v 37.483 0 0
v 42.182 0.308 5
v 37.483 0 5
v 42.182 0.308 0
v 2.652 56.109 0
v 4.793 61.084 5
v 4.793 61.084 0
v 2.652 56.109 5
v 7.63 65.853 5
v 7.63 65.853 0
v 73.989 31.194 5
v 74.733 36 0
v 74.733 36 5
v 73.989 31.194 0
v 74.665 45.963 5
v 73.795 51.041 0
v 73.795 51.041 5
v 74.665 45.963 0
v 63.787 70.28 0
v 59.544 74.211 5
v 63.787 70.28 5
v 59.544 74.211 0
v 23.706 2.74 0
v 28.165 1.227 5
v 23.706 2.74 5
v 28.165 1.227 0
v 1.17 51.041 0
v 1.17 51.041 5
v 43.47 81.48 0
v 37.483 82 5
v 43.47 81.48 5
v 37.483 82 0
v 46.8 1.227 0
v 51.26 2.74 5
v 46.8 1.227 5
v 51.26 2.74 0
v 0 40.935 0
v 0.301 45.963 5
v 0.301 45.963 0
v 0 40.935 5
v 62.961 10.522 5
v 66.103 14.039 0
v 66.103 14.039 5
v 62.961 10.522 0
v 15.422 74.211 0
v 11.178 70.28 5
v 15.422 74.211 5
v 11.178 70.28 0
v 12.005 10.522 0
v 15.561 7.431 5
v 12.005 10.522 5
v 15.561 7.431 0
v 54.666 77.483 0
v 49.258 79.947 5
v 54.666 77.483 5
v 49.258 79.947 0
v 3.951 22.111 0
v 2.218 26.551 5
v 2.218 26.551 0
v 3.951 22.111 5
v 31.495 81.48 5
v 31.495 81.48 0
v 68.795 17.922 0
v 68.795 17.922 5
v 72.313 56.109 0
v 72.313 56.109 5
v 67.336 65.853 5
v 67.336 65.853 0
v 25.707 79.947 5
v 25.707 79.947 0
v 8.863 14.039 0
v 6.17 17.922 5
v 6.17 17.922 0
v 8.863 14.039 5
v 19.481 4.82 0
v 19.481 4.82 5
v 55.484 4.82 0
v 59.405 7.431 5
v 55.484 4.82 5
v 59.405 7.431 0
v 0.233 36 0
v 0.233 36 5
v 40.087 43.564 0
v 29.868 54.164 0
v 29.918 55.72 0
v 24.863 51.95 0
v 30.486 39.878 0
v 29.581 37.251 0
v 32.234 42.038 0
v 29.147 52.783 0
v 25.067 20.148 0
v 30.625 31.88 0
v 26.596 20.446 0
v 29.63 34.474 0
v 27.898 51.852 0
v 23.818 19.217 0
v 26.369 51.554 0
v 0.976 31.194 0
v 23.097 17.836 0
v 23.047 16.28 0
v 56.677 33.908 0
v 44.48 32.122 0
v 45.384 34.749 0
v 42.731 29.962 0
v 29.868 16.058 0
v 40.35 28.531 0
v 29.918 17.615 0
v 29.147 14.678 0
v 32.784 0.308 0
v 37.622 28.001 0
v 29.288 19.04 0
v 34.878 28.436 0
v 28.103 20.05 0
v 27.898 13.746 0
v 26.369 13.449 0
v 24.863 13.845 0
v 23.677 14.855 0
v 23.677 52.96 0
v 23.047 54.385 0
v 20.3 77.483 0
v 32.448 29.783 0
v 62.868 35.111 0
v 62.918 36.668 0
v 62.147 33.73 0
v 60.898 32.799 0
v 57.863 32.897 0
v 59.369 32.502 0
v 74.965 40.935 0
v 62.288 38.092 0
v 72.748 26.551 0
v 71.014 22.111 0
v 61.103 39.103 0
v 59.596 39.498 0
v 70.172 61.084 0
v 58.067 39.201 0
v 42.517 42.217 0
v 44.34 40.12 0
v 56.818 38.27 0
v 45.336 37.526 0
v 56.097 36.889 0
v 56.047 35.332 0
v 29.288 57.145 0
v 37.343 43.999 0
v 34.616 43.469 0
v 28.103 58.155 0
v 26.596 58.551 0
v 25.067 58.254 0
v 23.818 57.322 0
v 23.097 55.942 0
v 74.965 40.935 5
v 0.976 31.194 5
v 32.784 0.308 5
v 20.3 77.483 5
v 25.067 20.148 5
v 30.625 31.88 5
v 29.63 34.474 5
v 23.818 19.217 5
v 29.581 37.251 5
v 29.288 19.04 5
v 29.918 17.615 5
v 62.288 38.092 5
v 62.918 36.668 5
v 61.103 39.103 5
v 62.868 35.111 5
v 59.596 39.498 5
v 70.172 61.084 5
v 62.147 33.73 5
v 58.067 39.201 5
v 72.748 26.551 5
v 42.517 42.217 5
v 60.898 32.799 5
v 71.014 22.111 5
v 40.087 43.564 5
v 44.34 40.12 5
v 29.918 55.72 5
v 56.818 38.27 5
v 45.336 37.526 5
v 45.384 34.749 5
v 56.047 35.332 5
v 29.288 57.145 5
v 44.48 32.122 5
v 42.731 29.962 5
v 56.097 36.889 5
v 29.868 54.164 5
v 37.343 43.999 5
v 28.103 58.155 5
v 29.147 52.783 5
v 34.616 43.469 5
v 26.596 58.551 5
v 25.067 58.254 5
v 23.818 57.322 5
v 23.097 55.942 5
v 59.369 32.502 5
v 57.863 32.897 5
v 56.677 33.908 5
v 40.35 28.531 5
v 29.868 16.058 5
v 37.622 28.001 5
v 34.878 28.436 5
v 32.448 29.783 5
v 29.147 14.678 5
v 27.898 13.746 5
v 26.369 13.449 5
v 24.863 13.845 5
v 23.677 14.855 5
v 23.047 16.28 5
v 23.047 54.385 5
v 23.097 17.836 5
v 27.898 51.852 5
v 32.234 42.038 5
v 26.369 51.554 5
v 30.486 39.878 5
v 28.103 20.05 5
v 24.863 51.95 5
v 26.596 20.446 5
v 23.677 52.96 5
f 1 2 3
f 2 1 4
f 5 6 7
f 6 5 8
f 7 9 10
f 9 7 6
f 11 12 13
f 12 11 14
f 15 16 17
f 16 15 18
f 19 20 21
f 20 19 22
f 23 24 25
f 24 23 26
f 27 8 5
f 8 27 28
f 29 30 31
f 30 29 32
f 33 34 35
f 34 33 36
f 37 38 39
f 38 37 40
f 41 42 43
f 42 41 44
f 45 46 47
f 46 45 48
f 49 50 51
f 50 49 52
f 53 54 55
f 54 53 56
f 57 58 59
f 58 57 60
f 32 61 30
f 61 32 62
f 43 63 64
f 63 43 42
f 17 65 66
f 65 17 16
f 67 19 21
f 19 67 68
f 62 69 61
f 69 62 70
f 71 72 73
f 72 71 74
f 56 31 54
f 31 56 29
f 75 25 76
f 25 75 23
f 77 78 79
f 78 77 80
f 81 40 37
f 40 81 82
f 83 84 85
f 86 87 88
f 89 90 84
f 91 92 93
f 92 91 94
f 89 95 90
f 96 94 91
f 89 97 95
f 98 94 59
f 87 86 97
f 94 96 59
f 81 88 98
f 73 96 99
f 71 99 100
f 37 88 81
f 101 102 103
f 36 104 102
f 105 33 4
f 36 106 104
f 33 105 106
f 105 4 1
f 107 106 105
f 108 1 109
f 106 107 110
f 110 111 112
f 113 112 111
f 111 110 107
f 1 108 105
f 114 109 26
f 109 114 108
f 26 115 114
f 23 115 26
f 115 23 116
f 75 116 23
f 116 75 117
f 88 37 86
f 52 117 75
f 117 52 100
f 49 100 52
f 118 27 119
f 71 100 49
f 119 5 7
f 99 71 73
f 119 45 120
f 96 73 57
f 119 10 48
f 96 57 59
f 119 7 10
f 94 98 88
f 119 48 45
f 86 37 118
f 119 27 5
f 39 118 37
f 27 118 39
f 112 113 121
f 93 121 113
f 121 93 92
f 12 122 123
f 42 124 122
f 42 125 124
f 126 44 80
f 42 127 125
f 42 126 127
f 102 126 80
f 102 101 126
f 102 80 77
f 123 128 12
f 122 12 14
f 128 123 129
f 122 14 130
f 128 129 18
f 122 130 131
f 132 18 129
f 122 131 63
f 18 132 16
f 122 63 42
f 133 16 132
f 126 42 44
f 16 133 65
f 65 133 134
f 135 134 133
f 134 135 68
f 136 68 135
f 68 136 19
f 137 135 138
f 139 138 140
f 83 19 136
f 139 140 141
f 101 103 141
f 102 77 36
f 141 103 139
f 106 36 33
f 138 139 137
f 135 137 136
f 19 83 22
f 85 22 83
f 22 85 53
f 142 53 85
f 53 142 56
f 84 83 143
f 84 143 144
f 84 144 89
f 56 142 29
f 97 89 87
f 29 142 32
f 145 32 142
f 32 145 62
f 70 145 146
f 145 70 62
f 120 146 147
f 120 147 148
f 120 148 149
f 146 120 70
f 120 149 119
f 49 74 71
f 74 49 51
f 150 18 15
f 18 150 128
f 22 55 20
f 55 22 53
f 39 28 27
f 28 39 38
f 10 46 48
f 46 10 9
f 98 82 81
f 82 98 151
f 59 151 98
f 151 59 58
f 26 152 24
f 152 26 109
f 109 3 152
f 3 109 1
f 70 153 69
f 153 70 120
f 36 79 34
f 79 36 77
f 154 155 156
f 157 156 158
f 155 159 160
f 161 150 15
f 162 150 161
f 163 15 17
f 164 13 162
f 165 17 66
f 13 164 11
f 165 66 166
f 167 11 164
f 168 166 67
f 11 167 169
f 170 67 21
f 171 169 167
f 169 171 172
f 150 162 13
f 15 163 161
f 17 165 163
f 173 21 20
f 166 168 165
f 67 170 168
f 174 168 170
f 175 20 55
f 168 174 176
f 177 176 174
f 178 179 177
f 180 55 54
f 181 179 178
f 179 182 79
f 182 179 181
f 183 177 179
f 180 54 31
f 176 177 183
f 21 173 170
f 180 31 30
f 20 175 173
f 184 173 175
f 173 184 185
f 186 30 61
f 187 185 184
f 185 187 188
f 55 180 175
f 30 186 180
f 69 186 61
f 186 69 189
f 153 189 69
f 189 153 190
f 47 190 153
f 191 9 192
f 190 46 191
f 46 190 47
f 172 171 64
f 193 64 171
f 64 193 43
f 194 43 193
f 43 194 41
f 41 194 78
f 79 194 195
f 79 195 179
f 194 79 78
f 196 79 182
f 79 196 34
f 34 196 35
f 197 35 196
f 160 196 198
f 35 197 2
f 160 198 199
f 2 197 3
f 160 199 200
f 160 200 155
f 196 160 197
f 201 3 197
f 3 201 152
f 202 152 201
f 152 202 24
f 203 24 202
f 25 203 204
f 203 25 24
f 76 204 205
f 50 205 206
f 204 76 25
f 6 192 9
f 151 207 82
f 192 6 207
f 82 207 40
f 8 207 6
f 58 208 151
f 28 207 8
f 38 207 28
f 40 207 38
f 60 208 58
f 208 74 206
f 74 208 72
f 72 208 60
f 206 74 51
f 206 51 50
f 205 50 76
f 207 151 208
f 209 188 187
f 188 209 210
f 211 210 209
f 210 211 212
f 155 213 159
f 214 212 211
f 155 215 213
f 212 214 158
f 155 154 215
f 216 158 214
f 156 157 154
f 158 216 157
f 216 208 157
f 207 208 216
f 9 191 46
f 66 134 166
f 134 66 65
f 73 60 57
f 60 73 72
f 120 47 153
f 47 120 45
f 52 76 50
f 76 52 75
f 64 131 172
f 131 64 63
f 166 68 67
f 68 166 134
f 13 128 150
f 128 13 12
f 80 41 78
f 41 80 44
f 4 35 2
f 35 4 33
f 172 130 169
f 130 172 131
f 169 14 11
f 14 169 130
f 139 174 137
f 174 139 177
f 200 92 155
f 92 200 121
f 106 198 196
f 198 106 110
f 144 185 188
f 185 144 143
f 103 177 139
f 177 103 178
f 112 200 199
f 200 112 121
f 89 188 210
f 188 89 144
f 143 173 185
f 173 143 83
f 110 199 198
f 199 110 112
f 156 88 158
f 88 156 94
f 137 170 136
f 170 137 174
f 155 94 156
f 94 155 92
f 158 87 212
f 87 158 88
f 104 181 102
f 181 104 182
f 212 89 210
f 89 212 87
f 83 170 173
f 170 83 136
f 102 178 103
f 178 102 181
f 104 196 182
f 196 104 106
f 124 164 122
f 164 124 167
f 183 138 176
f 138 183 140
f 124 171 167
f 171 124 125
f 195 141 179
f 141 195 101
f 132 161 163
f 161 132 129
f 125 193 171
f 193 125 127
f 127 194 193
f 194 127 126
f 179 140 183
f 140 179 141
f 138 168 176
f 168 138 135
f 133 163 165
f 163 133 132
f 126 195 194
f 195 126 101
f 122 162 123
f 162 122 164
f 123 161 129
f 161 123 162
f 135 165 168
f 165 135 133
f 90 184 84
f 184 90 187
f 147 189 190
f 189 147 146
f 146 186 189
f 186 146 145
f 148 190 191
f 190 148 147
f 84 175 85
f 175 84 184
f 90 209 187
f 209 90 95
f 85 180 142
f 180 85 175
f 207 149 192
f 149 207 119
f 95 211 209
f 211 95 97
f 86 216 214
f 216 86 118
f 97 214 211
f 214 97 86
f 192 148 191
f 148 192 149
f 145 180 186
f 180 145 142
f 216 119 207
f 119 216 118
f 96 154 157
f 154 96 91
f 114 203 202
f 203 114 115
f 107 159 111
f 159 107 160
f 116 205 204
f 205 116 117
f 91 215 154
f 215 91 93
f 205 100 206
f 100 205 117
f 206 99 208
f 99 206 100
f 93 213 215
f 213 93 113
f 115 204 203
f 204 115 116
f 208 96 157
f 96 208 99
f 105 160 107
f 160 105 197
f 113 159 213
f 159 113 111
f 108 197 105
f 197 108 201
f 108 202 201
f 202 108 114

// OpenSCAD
$fn = 32;

// ----------------------------------------------------------------------
// Cam plate: single_lobe cam, base R36
// ----------------------------------------------------------------------

// --- parameters (mm) ---
base_r = 36;              // base circle radius
lobe_h = 10;              // cam lobe rise
bore_r = 8;               // shaft bore radius
plate_t = 5;              // plate thickness, Z (extrusion height)
ring_r = 22;              // lightening ring radius
bolt_r = 3.5;             // lightening hole radius

profile = [[74.733, 36], [74.965, 40.935], [74.665, 45.963], [73.795, 51.041], [72.313, 56.109], [70.172, 61.084], [67.336, 65.853], [63.787, 70.28], [59.544, 74.211], [54.666, 77.483], [49.258, 79.947], [43.47, 81.48], [37.483, 82], [31.495, 81.48], [25.707, 79.947], [20.3, 77.483], [15.422, 74.211], [11.178, 70.28], [7.63, 65.853], [4.793, 61.084], [2.652, 56.109], [1.17, 51.041], [0.301, 45.963], [0, 40.935], [0.233, 36], [0.976, 31.194], [2.218, 26.551], [3.951, 22.111], [6.17, 17.922], [8.863, 14.039], [12.005, 10.522], [15.561, 7.431], [19.481, 4.82], [23.706, 2.74], [28.165, 1.227], [32.784, 0.308], [37.483, 0], [42.182, 0.308], [46.8, 1.227], [51.26, 2.74], [55.484, 4.82], [59.405, 7.431], [62.961, 10.522], [66.103, 14.039], [68.795, 17.922], [71.014, 22.111], [72.748, 26.551], [73.989, 31.194]];  // primary outline, 48 points, counter clockwise
void_1 = [[45.336, 37.526], [44.34, 40.12], [42.517, 42.217], [40.087, 43.564], [37.343, 43.999], [34.616, 43.469], [32.234, 42.038], [30.486, 39.878], [29.581, 37.251], [29.63, 34.474], [30.625, 31.88], [32.448, 29.783], [34.878, 28.436], [37.622, 28.001], [40.35, 28.531], [42.731, 29.962], [44.48, 32.122], [45.384, 34.749]];  // shaft bore, 18 points
void_2 = [[62.918, 36.668], [62.288, 38.092], [61.103, 39.103], [59.596, 39.498], [58.067, 39.201], [56.818, 38.27], [56.097, 36.889], [56.047, 35.332], [56.677, 33.908], [57.863, 32.897], [59.369, 32.502], [60.898, 32.799], [62.147, 33.73], [62.868, 35.111]];  // lightening hole 1, 14 points
void_3 = [[29.918, 55.72], [29.288, 57.145], [28.103, 58.155], [26.596, 58.551], [25.067, 58.254], [23.818, 57.322], [23.097, 55.942], [23.047, 54.385], [23.677, 52.96], [24.863, 51.95], [26.369, 51.554], [27.898, 51.852], [29.147, 52.783], [29.868, 54.164]];  // lightening hole 2, 14 points
void_4 = [[29.918, 17.615], [29.288, 19.04], [28.103, 20.05], [26.596, 20.446], [25.067, 20.148], [23.818, 19.217], [23.097, 17.836], [23.047, 16.28], [23.677, 14.855], [24.863, 13.845], [26.369, 13.449], [27.898, 13.746], [29.147, 14.678], [29.868, 16.058]];  // lightening hole 3, 14 points

// --- the one profile operation ---
difference() {
  linear_extrude(height = plate_t) polygon(points = profile);
  translate([0, 0, -1])
    linear_extrude(height = plate_t + 2) polygon(points = void_1);
  translate([0, 0, -1])
    linear_extrude(height = plate_t + 2) polygon(points = void_2);
  translate([0, 0, -1])
    linear_extrude(height = plate_t + 2) polygon(points = void_3);
  translate([0, 0, -1])
    linear_extrude(height = plate_t + 2) polygon(points = void_4);
}
